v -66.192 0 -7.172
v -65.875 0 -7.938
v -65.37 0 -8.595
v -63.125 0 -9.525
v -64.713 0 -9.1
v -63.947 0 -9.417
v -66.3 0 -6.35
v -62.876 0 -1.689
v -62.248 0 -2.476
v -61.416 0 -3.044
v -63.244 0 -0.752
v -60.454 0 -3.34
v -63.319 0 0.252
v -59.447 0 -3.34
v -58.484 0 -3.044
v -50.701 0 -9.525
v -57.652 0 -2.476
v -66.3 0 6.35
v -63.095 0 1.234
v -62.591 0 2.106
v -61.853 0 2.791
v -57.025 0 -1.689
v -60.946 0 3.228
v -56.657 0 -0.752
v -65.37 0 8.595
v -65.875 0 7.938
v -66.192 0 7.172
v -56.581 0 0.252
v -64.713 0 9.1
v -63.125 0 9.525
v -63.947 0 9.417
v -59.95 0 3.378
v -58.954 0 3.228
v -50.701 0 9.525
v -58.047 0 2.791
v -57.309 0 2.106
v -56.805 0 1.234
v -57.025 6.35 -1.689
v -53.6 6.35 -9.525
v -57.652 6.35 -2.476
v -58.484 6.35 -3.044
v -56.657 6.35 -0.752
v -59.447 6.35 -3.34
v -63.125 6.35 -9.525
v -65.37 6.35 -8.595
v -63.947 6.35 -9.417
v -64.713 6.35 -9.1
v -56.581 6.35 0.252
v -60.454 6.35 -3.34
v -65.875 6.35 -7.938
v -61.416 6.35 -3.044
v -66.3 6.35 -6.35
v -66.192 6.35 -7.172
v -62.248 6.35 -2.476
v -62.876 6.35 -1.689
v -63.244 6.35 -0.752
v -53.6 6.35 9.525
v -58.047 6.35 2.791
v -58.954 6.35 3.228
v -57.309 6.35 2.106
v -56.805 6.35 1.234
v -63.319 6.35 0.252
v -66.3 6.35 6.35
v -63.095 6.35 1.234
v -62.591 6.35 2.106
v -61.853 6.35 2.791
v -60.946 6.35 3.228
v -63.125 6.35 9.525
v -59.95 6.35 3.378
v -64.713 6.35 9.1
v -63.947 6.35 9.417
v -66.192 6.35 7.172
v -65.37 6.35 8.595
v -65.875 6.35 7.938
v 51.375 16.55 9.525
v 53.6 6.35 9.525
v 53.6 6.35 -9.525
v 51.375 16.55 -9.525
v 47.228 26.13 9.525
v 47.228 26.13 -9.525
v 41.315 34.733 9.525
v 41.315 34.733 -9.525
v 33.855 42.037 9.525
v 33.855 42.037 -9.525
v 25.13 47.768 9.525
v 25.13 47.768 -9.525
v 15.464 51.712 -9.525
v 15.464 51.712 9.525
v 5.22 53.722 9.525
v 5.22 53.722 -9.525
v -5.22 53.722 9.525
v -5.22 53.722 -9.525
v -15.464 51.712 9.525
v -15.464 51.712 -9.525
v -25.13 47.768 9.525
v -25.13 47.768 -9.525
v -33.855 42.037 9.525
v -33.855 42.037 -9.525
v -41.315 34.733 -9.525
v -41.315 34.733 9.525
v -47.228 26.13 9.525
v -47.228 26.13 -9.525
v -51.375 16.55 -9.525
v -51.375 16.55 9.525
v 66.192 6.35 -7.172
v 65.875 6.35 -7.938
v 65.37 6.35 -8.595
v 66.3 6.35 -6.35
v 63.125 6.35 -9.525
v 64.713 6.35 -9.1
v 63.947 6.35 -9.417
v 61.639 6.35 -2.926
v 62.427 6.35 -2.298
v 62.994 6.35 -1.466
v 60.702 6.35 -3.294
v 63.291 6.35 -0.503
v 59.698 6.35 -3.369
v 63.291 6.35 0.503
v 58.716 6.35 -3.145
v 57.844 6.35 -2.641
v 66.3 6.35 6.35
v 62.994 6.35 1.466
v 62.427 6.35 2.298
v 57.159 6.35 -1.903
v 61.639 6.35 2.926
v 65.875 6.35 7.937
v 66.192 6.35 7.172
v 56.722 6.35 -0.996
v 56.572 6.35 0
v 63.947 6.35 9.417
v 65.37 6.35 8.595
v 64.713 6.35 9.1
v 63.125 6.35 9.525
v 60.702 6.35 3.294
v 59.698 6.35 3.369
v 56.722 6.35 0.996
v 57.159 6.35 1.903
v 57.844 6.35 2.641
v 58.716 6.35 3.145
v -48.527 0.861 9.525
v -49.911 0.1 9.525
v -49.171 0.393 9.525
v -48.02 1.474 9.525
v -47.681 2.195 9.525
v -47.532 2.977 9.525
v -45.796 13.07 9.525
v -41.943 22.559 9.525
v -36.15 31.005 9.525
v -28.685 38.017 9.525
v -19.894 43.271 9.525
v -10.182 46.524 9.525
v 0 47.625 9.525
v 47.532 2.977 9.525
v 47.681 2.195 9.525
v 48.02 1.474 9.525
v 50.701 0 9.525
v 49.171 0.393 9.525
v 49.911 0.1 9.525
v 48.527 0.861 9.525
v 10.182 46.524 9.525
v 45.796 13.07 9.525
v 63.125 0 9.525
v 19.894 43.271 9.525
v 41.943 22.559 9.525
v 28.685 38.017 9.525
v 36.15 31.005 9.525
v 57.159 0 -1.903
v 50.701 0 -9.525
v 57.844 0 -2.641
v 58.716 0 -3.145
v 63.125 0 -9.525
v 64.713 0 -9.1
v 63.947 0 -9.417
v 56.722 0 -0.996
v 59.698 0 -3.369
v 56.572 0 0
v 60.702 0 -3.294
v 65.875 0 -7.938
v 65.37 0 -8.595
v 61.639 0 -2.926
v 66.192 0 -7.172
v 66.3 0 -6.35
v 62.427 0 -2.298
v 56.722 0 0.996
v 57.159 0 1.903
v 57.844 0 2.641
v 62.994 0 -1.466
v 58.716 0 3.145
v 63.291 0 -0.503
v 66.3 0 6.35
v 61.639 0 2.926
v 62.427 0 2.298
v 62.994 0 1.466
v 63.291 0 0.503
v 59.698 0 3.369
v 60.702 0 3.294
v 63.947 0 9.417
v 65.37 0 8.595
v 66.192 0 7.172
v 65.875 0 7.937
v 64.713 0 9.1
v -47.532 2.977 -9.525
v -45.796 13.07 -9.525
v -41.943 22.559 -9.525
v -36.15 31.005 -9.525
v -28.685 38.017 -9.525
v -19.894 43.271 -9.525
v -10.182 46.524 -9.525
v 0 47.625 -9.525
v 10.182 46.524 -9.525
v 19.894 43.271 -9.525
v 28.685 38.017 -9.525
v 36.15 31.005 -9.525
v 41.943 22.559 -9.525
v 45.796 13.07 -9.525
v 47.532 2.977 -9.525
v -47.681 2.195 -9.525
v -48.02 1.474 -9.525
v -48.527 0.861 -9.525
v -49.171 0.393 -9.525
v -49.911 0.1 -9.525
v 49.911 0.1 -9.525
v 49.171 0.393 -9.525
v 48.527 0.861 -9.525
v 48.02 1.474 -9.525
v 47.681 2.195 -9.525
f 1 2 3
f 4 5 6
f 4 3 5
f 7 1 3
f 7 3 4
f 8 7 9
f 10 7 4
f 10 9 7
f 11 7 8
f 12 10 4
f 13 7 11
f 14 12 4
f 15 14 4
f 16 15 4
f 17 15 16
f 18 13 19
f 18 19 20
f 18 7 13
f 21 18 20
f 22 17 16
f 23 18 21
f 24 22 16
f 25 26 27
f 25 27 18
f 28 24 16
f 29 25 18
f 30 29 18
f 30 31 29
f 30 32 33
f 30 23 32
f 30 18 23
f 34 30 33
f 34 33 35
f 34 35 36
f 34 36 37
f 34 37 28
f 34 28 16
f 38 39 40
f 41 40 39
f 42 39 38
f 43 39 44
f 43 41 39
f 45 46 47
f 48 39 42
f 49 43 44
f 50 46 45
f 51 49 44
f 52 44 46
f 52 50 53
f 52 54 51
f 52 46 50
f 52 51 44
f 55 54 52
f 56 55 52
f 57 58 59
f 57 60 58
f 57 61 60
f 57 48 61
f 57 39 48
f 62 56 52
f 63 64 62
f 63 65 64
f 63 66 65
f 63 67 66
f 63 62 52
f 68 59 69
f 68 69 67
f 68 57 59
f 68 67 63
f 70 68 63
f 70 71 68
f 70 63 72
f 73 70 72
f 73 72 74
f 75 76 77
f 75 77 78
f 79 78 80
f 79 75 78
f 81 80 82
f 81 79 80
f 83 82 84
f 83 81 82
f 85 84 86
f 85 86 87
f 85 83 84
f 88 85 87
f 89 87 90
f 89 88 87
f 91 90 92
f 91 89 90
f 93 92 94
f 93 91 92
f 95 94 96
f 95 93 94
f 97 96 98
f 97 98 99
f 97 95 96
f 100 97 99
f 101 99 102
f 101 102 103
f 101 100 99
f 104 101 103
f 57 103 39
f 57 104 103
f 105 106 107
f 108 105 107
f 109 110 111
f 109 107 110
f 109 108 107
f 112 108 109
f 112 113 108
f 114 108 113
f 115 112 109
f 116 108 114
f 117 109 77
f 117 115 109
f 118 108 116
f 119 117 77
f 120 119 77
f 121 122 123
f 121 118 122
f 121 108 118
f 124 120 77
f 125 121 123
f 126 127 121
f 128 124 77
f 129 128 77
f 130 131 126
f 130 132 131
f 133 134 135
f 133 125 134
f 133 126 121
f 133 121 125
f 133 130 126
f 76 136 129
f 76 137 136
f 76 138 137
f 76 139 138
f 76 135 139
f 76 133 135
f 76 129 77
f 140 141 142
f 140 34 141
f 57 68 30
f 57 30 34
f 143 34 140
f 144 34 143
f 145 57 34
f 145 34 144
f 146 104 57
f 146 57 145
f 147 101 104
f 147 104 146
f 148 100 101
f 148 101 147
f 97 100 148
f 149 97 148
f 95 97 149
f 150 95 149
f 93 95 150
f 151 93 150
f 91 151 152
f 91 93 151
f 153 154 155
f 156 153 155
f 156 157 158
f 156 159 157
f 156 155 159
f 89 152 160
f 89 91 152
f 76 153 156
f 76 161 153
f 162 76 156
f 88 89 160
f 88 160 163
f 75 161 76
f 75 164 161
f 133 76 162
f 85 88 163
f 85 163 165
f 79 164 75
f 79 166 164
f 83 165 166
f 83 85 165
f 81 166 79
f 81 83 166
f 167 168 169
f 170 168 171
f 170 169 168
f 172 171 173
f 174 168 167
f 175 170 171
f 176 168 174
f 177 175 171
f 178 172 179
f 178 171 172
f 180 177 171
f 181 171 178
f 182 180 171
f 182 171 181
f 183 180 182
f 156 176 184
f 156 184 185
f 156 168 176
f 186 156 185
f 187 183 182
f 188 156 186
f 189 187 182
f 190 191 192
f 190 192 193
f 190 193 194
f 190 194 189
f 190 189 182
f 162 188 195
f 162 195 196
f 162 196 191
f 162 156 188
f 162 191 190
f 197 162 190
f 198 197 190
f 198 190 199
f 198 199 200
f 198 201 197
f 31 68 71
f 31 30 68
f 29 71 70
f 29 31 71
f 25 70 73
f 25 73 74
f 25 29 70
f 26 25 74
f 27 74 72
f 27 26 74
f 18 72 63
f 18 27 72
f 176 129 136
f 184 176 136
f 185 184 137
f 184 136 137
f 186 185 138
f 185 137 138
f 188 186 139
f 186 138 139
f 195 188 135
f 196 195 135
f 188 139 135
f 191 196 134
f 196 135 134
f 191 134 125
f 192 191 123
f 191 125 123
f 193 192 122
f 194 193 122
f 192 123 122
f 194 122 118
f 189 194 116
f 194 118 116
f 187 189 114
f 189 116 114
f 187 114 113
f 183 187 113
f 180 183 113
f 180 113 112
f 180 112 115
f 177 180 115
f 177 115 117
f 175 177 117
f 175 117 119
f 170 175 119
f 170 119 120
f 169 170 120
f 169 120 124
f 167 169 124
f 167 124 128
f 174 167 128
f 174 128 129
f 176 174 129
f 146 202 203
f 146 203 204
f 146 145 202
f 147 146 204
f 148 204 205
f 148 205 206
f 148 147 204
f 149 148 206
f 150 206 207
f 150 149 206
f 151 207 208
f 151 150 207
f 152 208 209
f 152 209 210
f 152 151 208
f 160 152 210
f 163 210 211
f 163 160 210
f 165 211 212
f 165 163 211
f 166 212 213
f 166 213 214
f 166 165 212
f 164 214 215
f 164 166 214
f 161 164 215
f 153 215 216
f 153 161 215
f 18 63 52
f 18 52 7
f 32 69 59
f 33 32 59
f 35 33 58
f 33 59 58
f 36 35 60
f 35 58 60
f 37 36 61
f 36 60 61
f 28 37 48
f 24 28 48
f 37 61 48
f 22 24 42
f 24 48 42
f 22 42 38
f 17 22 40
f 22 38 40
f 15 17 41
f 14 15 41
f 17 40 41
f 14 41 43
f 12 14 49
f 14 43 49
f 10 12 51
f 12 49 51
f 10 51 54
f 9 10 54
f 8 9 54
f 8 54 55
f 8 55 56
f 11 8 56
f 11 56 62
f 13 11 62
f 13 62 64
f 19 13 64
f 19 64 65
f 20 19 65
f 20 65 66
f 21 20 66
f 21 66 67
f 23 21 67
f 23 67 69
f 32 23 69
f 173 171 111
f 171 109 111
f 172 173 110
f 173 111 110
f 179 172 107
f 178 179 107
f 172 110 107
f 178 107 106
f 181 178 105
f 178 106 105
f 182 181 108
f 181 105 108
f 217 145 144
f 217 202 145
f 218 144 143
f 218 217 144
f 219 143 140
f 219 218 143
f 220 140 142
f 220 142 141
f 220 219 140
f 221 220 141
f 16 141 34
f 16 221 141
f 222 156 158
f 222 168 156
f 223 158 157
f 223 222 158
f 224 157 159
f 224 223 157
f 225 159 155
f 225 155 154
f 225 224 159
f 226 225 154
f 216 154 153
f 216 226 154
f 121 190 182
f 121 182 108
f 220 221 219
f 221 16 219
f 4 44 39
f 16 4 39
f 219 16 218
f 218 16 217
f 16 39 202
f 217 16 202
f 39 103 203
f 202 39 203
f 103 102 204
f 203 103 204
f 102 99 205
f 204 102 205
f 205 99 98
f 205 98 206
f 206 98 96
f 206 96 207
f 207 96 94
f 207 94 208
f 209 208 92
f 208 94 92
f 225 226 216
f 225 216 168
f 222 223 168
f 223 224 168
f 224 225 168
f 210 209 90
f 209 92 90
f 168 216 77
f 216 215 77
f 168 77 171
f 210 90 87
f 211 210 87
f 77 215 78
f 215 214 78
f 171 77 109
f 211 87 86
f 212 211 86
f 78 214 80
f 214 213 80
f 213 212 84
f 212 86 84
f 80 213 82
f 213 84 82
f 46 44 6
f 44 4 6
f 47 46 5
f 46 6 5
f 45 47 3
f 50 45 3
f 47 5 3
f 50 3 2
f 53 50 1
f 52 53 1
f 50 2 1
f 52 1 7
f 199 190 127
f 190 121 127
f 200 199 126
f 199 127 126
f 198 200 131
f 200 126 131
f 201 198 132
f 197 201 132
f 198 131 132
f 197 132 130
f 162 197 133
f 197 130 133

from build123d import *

# Parameters (mm, degrees)
BOSS_EXTRUDE1_DEPTH = 9.525
CUT_EXTRUDE1_REACH  = 84.186
SKETCH3_R           = 3.3782
FILLET1_R           = 3.175


with BuildPart() as part:
    # Sketch2 → Boss-Extrude1 (new, symmetric)
    with BuildSketch(Plane.XY):
        with BuildLine():
            Line((47.625, 0), (66.300169076, 0))
            Line((66.300169076, 0), (66.300169076, 6.35))
            Line((66.300169076, 6.35), (53.600169076, 6.35))
            ThreePointArc((53.600169076, 6.35), (0, 53.975), (-53.600169076, 6.35))
            Line((-53.600169076, 6.35), (-66.300169076, 6.35))
            Line((-66.300169076, 6.35), (-66.300169076, 0))
            Line((-66.300169076, 0), (-47.625, 0))
            ThreePointArc((-47.625, 0), (0, 47.625), (47.625, 0))
        make_face()
    extrude(amount=BOSS_EXTRUDE1_DEPTH, both=True)

    # Sketch3 → Cut-Extrude1 (cut, up to next)
    with BuildSketch(Plane(origin=(0, 6.35, 0), x_dir=(1, 0, 0), z_dir=(0, 1, 0)), mode=Mode.PRIVATE) as cut_extrude1_sk1:
        with Locations(Location((59.950169076, 0, 0), (0, 0, 180))):
            Circle(SKETCH3_R)
    cut_extrude1_tool1 = extrude(cut_extrude1_sk1.sketch, amount=-CUT_EXTRUDE1_REACH, mode=Mode.PRIVATE) & part.part
    # Sketch3 → Cut-Extrude1 (cut, up to next)
    with BuildSketch(Plane(origin=(0, 6.35, 0), x_dir=(1, 0, 0), z_dir=(0, 1, 0)), mode=Mode.PRIVATE) as cut_extrude1_sk2:
        with Locations(Location((-59.950169076, 0, 0), (0, 0, 270))):
            Circle(SKETCH3_R)
    cut_extrude1_tool2 = extrude(cut_extrude1_sk2.sketch, amount=-CUT_EXTRUDE1_REACH, mode=Mode.PRIVATE) & part.part
    add(cut_extrude1_tool1.solids().sort_by_distance((59.950169, 6.35, 0))[0], mode=Mode.SUBTRACT)
    add(cut_extrude1_tool2.solids().sort_by_distance((-59.950169, 6.35, 0))[0], mode=Mode.SUBTRACT)

    # Fillet1
    fillet1_edges = [part.edges().sort_by_distance(p)[0] for p in [
        (66.300169076, 3.175, -9.525),
        (66.300169076, 3.175, 9.525),
        (-47.625, 0, 0),
        (47.625, 0, 0),
        (-66.300169076, 3.175, 9.525),
        (-66.300169076, 3.175, -9.525),
    ]]
    fillet(fillet1_edges, radius=FILLET1_R)


solid = part.part
